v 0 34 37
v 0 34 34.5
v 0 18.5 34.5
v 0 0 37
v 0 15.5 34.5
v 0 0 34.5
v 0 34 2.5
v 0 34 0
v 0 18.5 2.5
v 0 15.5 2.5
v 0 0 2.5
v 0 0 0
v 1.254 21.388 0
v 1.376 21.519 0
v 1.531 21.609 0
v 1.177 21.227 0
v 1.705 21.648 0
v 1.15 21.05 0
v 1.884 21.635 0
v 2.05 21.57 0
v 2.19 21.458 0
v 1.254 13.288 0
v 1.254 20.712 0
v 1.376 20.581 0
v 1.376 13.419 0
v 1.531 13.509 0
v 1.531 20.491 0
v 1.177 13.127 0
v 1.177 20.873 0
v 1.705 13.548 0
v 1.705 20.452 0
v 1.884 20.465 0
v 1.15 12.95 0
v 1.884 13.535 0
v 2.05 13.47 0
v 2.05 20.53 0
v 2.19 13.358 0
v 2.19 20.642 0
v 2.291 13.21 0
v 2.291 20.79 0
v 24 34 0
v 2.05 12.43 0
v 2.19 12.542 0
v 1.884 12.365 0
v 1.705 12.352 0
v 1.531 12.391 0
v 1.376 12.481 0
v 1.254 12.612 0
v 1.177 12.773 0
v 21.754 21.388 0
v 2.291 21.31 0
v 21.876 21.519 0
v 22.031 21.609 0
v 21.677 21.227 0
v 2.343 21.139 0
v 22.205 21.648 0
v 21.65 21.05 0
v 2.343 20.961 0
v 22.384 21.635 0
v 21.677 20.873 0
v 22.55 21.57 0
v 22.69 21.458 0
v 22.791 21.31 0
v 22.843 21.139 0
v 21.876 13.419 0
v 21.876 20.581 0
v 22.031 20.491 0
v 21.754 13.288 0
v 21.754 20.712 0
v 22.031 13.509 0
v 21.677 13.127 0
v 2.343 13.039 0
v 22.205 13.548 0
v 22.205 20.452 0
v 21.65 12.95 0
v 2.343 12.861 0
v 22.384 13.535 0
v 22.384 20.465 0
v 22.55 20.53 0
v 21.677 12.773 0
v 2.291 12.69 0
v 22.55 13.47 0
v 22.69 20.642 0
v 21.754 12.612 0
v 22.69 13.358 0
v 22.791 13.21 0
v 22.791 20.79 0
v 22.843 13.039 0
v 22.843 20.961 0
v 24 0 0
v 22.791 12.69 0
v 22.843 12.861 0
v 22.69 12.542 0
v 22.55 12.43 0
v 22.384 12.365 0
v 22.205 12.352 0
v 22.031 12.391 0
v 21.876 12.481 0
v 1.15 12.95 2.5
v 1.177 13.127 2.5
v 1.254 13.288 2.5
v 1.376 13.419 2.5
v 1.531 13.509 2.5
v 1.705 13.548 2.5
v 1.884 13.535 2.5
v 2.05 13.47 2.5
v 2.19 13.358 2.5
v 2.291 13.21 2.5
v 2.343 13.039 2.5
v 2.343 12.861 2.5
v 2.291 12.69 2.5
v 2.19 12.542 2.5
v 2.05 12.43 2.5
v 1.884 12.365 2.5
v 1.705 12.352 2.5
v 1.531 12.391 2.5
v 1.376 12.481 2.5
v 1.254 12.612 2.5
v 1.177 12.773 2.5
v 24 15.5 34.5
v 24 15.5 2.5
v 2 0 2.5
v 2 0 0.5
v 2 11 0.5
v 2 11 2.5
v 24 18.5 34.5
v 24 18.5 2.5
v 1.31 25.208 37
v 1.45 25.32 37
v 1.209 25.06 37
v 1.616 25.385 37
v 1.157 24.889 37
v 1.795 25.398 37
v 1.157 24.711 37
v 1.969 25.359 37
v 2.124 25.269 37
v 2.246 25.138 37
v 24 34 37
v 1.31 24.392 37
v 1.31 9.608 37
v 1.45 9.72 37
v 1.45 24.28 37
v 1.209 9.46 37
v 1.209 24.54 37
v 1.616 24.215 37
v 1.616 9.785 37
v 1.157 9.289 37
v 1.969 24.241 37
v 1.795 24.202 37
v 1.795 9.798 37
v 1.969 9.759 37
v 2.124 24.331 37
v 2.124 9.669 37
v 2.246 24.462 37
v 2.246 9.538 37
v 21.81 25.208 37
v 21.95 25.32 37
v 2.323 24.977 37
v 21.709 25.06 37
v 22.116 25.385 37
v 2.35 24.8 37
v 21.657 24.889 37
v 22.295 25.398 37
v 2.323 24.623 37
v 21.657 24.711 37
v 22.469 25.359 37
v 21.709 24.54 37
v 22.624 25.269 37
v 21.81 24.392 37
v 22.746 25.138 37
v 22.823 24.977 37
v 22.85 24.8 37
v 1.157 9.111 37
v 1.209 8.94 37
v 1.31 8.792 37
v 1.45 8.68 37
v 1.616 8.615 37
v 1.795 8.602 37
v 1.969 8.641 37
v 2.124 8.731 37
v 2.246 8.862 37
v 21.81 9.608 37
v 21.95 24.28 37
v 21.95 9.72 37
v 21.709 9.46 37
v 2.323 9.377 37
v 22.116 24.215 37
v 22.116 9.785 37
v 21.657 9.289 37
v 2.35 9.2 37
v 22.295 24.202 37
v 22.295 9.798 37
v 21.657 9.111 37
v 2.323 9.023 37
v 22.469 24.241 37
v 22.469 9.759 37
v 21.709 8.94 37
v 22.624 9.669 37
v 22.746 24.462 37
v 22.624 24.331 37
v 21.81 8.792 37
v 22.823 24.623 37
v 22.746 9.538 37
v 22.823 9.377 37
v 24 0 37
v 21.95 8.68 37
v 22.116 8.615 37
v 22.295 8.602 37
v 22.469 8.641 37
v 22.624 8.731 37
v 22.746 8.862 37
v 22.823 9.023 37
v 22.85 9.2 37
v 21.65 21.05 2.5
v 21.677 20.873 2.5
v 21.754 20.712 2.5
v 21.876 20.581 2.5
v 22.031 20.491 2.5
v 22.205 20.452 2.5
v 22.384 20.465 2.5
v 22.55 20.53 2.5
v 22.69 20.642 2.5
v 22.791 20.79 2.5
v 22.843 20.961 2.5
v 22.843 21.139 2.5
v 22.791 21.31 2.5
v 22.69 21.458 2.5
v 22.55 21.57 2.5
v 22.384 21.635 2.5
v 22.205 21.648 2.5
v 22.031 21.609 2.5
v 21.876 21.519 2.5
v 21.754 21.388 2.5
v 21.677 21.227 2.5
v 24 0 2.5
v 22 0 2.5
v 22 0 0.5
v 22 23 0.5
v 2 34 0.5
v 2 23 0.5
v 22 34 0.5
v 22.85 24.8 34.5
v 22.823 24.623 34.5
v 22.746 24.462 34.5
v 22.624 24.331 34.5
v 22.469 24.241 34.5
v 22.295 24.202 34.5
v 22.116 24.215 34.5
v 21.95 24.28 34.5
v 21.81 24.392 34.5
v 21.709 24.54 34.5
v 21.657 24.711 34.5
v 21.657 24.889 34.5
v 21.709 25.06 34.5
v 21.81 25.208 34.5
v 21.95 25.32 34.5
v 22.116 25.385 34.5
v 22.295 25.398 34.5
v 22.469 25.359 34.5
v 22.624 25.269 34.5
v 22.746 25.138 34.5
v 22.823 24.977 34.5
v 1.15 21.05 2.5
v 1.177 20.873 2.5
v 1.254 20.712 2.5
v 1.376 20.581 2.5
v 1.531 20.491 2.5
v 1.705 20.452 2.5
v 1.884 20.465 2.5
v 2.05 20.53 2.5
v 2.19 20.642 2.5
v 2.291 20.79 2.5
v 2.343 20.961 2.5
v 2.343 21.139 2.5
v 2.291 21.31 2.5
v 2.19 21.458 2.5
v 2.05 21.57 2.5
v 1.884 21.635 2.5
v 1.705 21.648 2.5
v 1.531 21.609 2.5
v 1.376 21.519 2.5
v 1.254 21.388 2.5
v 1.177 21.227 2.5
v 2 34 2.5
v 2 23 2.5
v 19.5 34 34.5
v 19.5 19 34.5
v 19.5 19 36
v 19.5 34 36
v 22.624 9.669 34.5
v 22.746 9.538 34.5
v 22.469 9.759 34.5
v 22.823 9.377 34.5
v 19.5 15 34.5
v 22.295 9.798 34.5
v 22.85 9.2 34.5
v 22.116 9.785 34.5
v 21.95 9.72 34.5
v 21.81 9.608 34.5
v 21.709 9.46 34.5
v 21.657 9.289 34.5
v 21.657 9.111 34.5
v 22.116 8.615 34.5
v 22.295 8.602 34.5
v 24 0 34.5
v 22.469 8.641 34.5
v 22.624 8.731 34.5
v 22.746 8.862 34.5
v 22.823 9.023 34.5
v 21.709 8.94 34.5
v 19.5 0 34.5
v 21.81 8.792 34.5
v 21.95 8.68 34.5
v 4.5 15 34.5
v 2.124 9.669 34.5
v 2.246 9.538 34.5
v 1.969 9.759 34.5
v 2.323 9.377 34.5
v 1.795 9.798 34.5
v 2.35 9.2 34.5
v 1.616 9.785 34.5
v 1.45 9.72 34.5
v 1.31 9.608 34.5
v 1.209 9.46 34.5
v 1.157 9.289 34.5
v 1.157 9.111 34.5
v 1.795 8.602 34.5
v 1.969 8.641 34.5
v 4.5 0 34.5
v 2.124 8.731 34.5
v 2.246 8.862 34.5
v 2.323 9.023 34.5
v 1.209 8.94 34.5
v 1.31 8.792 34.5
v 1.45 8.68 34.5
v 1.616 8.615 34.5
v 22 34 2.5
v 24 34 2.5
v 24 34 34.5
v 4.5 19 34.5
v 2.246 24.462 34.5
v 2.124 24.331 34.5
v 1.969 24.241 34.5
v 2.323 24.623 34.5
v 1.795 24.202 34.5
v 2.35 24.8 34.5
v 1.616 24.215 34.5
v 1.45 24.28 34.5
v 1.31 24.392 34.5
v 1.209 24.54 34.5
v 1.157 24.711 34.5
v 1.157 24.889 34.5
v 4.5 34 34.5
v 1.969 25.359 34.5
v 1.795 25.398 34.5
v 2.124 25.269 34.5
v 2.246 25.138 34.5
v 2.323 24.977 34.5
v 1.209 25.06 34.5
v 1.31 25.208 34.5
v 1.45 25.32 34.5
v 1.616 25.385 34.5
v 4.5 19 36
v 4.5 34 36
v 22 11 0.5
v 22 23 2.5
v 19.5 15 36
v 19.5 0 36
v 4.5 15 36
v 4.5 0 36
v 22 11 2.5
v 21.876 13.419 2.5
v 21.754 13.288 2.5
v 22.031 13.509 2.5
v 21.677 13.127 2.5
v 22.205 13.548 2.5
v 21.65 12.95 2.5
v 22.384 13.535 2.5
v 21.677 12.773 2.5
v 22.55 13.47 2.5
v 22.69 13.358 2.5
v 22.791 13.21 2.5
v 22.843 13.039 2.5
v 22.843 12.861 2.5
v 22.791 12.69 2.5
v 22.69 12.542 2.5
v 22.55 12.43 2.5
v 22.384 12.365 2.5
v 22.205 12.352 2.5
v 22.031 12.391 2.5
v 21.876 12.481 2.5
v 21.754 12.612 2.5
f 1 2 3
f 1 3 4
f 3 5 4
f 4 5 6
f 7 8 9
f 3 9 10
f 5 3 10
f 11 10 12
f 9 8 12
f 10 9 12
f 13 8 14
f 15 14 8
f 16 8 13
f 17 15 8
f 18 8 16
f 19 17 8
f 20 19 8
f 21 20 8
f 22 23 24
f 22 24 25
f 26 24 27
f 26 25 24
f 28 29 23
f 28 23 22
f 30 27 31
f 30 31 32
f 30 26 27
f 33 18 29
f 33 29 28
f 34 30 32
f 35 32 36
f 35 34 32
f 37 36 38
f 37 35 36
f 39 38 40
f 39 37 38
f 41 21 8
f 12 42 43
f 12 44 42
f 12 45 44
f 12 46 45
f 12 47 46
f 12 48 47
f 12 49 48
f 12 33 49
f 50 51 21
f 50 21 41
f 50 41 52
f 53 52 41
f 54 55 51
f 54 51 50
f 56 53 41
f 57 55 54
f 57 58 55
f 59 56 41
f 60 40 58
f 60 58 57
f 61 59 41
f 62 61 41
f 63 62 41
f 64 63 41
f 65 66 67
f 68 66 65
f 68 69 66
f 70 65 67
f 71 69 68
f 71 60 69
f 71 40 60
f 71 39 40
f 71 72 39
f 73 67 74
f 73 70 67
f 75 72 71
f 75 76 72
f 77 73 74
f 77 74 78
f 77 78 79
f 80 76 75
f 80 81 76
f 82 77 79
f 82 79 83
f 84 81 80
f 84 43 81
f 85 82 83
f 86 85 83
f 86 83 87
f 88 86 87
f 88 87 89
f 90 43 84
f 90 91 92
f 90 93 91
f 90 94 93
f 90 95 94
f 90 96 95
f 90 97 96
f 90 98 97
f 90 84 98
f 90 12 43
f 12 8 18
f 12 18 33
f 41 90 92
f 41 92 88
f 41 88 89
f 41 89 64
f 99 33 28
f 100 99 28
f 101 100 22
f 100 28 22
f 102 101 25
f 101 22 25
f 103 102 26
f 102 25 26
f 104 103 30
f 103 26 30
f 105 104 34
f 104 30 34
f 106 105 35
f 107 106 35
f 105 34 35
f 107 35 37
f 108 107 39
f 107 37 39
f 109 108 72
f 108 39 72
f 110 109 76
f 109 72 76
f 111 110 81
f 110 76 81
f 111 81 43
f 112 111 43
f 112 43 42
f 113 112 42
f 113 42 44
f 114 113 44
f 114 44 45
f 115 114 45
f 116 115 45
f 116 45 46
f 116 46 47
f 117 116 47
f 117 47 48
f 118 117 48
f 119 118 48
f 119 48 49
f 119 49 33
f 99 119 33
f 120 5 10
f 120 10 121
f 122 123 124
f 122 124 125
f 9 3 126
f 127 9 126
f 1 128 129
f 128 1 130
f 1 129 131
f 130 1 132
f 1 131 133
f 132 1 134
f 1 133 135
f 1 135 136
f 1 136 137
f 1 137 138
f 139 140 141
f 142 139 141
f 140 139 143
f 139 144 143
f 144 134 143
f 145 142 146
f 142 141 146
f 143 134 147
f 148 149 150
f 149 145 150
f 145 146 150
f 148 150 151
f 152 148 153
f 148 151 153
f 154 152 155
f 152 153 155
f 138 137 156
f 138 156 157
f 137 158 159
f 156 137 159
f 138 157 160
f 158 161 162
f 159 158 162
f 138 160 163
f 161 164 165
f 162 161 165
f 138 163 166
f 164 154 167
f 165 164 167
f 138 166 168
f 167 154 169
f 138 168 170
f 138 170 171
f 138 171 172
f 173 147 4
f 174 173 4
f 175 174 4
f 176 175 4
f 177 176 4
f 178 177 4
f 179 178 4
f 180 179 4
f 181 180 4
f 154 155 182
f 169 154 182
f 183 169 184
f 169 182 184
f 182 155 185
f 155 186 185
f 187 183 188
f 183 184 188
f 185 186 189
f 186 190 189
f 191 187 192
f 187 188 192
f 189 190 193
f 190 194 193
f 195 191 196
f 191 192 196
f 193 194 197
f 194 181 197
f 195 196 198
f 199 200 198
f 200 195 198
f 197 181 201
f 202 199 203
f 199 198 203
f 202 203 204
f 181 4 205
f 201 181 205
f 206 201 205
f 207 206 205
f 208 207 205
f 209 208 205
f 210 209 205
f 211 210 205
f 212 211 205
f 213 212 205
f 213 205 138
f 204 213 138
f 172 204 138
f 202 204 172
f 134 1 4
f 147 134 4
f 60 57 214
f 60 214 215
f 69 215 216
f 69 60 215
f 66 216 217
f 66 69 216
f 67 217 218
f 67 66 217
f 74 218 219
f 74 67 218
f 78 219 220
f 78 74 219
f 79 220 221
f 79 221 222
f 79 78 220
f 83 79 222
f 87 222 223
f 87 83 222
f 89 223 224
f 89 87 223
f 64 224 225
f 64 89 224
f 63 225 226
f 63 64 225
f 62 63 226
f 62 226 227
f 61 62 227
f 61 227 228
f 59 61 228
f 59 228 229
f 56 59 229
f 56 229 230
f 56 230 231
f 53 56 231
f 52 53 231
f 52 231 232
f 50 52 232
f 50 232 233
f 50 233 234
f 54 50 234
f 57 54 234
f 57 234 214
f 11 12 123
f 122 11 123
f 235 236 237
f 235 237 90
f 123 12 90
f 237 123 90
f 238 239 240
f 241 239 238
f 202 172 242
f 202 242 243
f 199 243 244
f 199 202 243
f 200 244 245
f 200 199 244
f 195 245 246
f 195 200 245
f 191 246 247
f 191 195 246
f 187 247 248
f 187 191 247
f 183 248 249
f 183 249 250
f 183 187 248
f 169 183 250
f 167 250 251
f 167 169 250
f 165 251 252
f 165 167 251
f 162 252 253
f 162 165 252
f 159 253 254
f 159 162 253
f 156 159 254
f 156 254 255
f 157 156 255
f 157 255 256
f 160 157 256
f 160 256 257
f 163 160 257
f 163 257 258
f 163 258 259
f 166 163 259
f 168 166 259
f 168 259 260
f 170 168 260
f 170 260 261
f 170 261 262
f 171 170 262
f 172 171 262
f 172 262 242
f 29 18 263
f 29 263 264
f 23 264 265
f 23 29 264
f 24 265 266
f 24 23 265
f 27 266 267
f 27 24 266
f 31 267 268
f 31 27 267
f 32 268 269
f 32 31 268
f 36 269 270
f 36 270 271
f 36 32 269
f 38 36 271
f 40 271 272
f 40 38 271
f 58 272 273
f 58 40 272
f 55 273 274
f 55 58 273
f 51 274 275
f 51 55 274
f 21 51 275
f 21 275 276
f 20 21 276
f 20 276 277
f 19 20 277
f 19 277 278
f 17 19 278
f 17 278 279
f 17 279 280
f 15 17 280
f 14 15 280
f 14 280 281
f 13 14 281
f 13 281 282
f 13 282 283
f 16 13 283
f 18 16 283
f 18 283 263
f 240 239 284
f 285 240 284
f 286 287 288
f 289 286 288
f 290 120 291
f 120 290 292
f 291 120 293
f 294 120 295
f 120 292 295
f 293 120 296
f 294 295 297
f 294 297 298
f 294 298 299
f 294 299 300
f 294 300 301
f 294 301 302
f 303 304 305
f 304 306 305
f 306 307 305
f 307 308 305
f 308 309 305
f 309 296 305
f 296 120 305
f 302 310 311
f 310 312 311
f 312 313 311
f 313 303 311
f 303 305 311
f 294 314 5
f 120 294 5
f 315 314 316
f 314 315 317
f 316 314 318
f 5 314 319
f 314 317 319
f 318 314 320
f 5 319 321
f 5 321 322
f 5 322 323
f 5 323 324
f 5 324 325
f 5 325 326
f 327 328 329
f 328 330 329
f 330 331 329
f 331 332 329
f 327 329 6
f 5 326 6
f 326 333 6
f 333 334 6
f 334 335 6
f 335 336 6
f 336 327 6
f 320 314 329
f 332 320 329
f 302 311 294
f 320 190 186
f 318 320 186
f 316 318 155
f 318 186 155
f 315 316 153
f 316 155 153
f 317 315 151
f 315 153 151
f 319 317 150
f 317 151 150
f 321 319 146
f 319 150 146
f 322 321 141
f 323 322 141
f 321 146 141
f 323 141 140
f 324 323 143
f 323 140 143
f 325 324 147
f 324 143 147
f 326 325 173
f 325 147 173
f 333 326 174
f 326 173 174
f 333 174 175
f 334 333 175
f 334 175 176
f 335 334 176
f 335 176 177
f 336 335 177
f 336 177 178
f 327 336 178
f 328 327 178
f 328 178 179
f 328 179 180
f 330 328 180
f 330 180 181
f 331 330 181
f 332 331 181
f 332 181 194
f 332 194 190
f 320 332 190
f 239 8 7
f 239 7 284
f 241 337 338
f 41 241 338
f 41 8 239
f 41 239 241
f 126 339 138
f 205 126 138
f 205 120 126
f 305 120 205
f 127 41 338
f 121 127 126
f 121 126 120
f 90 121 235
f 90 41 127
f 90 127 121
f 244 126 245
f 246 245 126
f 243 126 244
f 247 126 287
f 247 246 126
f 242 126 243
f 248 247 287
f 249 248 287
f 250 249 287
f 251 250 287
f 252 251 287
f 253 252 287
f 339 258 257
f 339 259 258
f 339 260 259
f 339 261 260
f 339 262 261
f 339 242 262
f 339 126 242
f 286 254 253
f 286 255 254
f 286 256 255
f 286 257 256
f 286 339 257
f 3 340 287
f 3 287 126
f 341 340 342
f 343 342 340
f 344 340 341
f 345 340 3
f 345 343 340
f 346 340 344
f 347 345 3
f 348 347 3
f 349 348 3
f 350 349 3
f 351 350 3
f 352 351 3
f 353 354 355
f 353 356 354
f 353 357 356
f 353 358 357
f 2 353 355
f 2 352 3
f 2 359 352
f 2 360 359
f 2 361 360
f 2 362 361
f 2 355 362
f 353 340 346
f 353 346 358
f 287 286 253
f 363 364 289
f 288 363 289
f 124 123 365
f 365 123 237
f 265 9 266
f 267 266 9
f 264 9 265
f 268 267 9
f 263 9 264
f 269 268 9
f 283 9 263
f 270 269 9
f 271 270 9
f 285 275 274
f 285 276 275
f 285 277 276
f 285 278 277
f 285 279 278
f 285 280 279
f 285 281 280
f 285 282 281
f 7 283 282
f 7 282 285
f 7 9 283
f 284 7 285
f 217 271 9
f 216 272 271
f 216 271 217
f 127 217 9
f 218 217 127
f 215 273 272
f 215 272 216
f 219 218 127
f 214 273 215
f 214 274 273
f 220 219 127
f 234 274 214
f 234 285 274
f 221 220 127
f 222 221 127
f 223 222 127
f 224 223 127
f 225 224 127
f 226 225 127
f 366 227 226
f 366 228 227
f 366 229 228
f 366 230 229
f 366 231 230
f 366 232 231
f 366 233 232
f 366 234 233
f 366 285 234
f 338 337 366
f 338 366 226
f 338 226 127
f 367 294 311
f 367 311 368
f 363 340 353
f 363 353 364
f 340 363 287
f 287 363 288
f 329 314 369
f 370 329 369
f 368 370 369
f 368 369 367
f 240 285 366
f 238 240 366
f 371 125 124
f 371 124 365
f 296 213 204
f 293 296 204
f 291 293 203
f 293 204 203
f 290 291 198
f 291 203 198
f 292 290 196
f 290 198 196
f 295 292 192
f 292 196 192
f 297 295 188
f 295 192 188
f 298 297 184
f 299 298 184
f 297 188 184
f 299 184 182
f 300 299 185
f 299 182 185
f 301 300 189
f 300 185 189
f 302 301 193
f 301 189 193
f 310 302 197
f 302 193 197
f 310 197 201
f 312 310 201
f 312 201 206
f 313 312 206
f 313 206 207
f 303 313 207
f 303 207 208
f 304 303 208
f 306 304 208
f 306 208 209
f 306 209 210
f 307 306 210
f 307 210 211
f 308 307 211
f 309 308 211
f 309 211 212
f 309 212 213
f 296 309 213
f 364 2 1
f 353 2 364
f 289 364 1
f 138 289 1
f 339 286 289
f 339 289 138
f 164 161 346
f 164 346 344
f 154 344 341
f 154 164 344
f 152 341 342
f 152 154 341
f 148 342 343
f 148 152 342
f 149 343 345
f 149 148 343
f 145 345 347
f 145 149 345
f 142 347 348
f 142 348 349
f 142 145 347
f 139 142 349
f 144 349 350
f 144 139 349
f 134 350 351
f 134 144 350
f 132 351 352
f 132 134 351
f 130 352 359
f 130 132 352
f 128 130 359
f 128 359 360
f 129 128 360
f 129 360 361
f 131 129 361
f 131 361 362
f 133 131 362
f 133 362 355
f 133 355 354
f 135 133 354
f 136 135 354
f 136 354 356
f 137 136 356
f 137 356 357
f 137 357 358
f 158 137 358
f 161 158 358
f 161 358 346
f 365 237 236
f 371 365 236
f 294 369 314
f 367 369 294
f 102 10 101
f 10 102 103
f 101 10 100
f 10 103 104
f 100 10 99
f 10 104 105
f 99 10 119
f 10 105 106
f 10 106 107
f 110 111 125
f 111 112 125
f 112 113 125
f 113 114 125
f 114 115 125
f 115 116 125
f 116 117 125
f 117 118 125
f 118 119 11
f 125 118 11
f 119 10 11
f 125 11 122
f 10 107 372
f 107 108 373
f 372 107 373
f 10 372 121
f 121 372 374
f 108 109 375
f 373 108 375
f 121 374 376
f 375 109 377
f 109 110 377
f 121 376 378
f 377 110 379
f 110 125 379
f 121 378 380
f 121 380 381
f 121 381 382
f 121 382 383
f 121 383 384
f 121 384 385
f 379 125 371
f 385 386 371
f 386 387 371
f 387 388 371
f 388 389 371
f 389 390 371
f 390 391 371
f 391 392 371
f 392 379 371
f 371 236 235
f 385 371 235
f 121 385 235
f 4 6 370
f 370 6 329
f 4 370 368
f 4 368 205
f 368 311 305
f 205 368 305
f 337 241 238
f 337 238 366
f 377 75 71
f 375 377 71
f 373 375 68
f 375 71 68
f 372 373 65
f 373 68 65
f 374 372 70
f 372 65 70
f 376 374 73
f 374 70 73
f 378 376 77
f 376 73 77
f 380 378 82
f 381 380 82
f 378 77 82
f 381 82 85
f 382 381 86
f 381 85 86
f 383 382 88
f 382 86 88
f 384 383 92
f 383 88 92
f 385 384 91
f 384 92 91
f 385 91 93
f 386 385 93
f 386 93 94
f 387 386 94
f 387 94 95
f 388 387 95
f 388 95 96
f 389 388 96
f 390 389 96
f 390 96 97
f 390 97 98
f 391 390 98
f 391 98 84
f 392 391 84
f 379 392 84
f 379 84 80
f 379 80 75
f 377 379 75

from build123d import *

# Parameters (mm, degrees)
SKETCH_1_W          = 24
SKETCH_1_H          = 17
EXTRUDE_1_DEPTH     = 37
CUT_EXTRUDE_1_DEPTH = 15.5
CUT_EXTRUDE_2_REACH = 49.265
SKETCH_3_R          = 0.6
CUT_EXTRUDE_3_REACH = 49.265
SKETCH_4_R          = 0.6
SKETCH_5_W          = 20
SKETCH_5_H          = 2
CUT_EXTRUDE_4_DEPTH = 11
SKETCH_6_W          = 15
SKETCH_6_H          = 1.5
CUT_EXTRUDE_5_DEPTH = 15


with BuildPart() as part:
    # 草图1 → 凸台-拉伸1 (new body)
    with BuildSketch(Plane.XY):
        with Locations((12, 8.5)):
            Rectangle(SKETCH_1_W, SKETCH_1_H)
    extrude(amount=EXTRUDE_1_DEPTH)

    # 草图2 → 切除-拉伸1 (cut)
    with BuildSketch(Plane.XZ):
        Polygon((24, 34.5), (0, 34.5), (0, 18.5), (0, 2.5), (24, 2.5), align=None)
    extrude(amount=-CUT_EXTRUDE_1_DEPTH, mode=Mode.SUBTRACT)

    # 草图3 → 切除-拉伸2 (cut, up to next)
    with BuildSketch(Plane.XY.offset(37), mode=Mode.PRIVATE) as cut_extrude_2_sk1:
        with Locations((1.75, 9.2)):
            Circle(SKETCH_3_R)
    cut_extrude_2_tool1 = extrude(cut_extrude_2_sk1.sketch, amount=-CUT_EXTRUDE_2_REACH, mode=Mode.PRIVATE) & part.part
    # 草图3 → 切除-拉伸2 (cut, up to next)
    with BuildSketch(Plane.XY.offset(37), mode=Mode.PRIVATE) as cut_extrude_2_sk2:
        with Locations((22.25, 9.2)):
            Circle(SKETCH_3_R)
    cut_extrude_2_tool2 = extrude(cut_extrude_2_sk2.sketch, amount=-CUT_EXTRUDE_2_REACH, mode=Mode.PRIVATE) & part.part
    add(cut_extrude_2_tool1.solids().sort_by_distance((1.75, 9.2, 37))[0], mode=Mode.SUBTRACT)
    add(cut_extrude_2_tool2.solids().sort_by_distance((22.25, 9.2, 37))[0], mode=Mode.SUBTRACT)

    # 草图4 → 切除-拉伸3 (cut, up to next)
    with BuildSketch(Plane(origin=(0, 0, 0), x_dir=(-1, 0, 0), z_dir=(0, 0, -1)), mode=Mode.PRIVATE) as cut_extrude_3_sk1:
        with Locations((-22.25, 12.95)):
            Circle(SKETCH_4_R)
    cut_extrude_3_tool1 = extrude(cut_extrude_3_sk1.sketch, amount=-CUT_EXTRUDE_3_REACH, mode=Mode.PRIVATE) & part.part
    # 草图4 → 切除-拉伸3 (cut, up to next)
    with BuildSketch(Plane(origin=(0, 0, 0), x_dir=(-1, 0, 0), z_dir=(0, 0, -1)), mode=Mode.PRIVATE) as cut_extrude_3_sk2:
        with Locations((-1.75, 12.95)):
            Circle(SKETCH_4_R)
    cut_extrude_3_tool2 = extrude(cut_extrude_3_sk2.sketch, amount=-CUT_EXTRUDE_3_REACH, mode=Mode.PRIVATE) & part.part
    add(cut_extrude_3_tool1.solids().sort_by_distance((22.25, 12.95, 0))[0], mode=Mode.SUBTRACT)
    add(cut_extrude_3_tool2.solids().sort_by_distance((1.75, 12.95, 0))[0], mode=Mode.SUBTRACT)

    # 草图5 → 切除-拉伸4 (cut)
    with BuildSketch(Plane.XZ):
        with Locations((12, 1.5)):
            Rectangle(SKETCH_5_W, SKETCH_5_H)
    extrude(amount=-CUT_EXTRUDE_4_DEPTH, mode=Mode.SUBTRACT)

    # 草图6 → 切除-拉伸5 (cut)
    with BuildSketch(Plane.XZ):
        with Locations((12, 35.25)):
            Rectangle(SKETCH_6_W, SKETCH_6_H)
    extrude(amount=-CUT_EXTRUDE_5_DEPTH, mode=Mode.SUBTRACT)

    # 镜向1: part across plane


with BuildPart() as part_1:
    add(part.part)
    add(part.part.mirror(Plane.ZX.offset(17)))


solid = part_1.part
